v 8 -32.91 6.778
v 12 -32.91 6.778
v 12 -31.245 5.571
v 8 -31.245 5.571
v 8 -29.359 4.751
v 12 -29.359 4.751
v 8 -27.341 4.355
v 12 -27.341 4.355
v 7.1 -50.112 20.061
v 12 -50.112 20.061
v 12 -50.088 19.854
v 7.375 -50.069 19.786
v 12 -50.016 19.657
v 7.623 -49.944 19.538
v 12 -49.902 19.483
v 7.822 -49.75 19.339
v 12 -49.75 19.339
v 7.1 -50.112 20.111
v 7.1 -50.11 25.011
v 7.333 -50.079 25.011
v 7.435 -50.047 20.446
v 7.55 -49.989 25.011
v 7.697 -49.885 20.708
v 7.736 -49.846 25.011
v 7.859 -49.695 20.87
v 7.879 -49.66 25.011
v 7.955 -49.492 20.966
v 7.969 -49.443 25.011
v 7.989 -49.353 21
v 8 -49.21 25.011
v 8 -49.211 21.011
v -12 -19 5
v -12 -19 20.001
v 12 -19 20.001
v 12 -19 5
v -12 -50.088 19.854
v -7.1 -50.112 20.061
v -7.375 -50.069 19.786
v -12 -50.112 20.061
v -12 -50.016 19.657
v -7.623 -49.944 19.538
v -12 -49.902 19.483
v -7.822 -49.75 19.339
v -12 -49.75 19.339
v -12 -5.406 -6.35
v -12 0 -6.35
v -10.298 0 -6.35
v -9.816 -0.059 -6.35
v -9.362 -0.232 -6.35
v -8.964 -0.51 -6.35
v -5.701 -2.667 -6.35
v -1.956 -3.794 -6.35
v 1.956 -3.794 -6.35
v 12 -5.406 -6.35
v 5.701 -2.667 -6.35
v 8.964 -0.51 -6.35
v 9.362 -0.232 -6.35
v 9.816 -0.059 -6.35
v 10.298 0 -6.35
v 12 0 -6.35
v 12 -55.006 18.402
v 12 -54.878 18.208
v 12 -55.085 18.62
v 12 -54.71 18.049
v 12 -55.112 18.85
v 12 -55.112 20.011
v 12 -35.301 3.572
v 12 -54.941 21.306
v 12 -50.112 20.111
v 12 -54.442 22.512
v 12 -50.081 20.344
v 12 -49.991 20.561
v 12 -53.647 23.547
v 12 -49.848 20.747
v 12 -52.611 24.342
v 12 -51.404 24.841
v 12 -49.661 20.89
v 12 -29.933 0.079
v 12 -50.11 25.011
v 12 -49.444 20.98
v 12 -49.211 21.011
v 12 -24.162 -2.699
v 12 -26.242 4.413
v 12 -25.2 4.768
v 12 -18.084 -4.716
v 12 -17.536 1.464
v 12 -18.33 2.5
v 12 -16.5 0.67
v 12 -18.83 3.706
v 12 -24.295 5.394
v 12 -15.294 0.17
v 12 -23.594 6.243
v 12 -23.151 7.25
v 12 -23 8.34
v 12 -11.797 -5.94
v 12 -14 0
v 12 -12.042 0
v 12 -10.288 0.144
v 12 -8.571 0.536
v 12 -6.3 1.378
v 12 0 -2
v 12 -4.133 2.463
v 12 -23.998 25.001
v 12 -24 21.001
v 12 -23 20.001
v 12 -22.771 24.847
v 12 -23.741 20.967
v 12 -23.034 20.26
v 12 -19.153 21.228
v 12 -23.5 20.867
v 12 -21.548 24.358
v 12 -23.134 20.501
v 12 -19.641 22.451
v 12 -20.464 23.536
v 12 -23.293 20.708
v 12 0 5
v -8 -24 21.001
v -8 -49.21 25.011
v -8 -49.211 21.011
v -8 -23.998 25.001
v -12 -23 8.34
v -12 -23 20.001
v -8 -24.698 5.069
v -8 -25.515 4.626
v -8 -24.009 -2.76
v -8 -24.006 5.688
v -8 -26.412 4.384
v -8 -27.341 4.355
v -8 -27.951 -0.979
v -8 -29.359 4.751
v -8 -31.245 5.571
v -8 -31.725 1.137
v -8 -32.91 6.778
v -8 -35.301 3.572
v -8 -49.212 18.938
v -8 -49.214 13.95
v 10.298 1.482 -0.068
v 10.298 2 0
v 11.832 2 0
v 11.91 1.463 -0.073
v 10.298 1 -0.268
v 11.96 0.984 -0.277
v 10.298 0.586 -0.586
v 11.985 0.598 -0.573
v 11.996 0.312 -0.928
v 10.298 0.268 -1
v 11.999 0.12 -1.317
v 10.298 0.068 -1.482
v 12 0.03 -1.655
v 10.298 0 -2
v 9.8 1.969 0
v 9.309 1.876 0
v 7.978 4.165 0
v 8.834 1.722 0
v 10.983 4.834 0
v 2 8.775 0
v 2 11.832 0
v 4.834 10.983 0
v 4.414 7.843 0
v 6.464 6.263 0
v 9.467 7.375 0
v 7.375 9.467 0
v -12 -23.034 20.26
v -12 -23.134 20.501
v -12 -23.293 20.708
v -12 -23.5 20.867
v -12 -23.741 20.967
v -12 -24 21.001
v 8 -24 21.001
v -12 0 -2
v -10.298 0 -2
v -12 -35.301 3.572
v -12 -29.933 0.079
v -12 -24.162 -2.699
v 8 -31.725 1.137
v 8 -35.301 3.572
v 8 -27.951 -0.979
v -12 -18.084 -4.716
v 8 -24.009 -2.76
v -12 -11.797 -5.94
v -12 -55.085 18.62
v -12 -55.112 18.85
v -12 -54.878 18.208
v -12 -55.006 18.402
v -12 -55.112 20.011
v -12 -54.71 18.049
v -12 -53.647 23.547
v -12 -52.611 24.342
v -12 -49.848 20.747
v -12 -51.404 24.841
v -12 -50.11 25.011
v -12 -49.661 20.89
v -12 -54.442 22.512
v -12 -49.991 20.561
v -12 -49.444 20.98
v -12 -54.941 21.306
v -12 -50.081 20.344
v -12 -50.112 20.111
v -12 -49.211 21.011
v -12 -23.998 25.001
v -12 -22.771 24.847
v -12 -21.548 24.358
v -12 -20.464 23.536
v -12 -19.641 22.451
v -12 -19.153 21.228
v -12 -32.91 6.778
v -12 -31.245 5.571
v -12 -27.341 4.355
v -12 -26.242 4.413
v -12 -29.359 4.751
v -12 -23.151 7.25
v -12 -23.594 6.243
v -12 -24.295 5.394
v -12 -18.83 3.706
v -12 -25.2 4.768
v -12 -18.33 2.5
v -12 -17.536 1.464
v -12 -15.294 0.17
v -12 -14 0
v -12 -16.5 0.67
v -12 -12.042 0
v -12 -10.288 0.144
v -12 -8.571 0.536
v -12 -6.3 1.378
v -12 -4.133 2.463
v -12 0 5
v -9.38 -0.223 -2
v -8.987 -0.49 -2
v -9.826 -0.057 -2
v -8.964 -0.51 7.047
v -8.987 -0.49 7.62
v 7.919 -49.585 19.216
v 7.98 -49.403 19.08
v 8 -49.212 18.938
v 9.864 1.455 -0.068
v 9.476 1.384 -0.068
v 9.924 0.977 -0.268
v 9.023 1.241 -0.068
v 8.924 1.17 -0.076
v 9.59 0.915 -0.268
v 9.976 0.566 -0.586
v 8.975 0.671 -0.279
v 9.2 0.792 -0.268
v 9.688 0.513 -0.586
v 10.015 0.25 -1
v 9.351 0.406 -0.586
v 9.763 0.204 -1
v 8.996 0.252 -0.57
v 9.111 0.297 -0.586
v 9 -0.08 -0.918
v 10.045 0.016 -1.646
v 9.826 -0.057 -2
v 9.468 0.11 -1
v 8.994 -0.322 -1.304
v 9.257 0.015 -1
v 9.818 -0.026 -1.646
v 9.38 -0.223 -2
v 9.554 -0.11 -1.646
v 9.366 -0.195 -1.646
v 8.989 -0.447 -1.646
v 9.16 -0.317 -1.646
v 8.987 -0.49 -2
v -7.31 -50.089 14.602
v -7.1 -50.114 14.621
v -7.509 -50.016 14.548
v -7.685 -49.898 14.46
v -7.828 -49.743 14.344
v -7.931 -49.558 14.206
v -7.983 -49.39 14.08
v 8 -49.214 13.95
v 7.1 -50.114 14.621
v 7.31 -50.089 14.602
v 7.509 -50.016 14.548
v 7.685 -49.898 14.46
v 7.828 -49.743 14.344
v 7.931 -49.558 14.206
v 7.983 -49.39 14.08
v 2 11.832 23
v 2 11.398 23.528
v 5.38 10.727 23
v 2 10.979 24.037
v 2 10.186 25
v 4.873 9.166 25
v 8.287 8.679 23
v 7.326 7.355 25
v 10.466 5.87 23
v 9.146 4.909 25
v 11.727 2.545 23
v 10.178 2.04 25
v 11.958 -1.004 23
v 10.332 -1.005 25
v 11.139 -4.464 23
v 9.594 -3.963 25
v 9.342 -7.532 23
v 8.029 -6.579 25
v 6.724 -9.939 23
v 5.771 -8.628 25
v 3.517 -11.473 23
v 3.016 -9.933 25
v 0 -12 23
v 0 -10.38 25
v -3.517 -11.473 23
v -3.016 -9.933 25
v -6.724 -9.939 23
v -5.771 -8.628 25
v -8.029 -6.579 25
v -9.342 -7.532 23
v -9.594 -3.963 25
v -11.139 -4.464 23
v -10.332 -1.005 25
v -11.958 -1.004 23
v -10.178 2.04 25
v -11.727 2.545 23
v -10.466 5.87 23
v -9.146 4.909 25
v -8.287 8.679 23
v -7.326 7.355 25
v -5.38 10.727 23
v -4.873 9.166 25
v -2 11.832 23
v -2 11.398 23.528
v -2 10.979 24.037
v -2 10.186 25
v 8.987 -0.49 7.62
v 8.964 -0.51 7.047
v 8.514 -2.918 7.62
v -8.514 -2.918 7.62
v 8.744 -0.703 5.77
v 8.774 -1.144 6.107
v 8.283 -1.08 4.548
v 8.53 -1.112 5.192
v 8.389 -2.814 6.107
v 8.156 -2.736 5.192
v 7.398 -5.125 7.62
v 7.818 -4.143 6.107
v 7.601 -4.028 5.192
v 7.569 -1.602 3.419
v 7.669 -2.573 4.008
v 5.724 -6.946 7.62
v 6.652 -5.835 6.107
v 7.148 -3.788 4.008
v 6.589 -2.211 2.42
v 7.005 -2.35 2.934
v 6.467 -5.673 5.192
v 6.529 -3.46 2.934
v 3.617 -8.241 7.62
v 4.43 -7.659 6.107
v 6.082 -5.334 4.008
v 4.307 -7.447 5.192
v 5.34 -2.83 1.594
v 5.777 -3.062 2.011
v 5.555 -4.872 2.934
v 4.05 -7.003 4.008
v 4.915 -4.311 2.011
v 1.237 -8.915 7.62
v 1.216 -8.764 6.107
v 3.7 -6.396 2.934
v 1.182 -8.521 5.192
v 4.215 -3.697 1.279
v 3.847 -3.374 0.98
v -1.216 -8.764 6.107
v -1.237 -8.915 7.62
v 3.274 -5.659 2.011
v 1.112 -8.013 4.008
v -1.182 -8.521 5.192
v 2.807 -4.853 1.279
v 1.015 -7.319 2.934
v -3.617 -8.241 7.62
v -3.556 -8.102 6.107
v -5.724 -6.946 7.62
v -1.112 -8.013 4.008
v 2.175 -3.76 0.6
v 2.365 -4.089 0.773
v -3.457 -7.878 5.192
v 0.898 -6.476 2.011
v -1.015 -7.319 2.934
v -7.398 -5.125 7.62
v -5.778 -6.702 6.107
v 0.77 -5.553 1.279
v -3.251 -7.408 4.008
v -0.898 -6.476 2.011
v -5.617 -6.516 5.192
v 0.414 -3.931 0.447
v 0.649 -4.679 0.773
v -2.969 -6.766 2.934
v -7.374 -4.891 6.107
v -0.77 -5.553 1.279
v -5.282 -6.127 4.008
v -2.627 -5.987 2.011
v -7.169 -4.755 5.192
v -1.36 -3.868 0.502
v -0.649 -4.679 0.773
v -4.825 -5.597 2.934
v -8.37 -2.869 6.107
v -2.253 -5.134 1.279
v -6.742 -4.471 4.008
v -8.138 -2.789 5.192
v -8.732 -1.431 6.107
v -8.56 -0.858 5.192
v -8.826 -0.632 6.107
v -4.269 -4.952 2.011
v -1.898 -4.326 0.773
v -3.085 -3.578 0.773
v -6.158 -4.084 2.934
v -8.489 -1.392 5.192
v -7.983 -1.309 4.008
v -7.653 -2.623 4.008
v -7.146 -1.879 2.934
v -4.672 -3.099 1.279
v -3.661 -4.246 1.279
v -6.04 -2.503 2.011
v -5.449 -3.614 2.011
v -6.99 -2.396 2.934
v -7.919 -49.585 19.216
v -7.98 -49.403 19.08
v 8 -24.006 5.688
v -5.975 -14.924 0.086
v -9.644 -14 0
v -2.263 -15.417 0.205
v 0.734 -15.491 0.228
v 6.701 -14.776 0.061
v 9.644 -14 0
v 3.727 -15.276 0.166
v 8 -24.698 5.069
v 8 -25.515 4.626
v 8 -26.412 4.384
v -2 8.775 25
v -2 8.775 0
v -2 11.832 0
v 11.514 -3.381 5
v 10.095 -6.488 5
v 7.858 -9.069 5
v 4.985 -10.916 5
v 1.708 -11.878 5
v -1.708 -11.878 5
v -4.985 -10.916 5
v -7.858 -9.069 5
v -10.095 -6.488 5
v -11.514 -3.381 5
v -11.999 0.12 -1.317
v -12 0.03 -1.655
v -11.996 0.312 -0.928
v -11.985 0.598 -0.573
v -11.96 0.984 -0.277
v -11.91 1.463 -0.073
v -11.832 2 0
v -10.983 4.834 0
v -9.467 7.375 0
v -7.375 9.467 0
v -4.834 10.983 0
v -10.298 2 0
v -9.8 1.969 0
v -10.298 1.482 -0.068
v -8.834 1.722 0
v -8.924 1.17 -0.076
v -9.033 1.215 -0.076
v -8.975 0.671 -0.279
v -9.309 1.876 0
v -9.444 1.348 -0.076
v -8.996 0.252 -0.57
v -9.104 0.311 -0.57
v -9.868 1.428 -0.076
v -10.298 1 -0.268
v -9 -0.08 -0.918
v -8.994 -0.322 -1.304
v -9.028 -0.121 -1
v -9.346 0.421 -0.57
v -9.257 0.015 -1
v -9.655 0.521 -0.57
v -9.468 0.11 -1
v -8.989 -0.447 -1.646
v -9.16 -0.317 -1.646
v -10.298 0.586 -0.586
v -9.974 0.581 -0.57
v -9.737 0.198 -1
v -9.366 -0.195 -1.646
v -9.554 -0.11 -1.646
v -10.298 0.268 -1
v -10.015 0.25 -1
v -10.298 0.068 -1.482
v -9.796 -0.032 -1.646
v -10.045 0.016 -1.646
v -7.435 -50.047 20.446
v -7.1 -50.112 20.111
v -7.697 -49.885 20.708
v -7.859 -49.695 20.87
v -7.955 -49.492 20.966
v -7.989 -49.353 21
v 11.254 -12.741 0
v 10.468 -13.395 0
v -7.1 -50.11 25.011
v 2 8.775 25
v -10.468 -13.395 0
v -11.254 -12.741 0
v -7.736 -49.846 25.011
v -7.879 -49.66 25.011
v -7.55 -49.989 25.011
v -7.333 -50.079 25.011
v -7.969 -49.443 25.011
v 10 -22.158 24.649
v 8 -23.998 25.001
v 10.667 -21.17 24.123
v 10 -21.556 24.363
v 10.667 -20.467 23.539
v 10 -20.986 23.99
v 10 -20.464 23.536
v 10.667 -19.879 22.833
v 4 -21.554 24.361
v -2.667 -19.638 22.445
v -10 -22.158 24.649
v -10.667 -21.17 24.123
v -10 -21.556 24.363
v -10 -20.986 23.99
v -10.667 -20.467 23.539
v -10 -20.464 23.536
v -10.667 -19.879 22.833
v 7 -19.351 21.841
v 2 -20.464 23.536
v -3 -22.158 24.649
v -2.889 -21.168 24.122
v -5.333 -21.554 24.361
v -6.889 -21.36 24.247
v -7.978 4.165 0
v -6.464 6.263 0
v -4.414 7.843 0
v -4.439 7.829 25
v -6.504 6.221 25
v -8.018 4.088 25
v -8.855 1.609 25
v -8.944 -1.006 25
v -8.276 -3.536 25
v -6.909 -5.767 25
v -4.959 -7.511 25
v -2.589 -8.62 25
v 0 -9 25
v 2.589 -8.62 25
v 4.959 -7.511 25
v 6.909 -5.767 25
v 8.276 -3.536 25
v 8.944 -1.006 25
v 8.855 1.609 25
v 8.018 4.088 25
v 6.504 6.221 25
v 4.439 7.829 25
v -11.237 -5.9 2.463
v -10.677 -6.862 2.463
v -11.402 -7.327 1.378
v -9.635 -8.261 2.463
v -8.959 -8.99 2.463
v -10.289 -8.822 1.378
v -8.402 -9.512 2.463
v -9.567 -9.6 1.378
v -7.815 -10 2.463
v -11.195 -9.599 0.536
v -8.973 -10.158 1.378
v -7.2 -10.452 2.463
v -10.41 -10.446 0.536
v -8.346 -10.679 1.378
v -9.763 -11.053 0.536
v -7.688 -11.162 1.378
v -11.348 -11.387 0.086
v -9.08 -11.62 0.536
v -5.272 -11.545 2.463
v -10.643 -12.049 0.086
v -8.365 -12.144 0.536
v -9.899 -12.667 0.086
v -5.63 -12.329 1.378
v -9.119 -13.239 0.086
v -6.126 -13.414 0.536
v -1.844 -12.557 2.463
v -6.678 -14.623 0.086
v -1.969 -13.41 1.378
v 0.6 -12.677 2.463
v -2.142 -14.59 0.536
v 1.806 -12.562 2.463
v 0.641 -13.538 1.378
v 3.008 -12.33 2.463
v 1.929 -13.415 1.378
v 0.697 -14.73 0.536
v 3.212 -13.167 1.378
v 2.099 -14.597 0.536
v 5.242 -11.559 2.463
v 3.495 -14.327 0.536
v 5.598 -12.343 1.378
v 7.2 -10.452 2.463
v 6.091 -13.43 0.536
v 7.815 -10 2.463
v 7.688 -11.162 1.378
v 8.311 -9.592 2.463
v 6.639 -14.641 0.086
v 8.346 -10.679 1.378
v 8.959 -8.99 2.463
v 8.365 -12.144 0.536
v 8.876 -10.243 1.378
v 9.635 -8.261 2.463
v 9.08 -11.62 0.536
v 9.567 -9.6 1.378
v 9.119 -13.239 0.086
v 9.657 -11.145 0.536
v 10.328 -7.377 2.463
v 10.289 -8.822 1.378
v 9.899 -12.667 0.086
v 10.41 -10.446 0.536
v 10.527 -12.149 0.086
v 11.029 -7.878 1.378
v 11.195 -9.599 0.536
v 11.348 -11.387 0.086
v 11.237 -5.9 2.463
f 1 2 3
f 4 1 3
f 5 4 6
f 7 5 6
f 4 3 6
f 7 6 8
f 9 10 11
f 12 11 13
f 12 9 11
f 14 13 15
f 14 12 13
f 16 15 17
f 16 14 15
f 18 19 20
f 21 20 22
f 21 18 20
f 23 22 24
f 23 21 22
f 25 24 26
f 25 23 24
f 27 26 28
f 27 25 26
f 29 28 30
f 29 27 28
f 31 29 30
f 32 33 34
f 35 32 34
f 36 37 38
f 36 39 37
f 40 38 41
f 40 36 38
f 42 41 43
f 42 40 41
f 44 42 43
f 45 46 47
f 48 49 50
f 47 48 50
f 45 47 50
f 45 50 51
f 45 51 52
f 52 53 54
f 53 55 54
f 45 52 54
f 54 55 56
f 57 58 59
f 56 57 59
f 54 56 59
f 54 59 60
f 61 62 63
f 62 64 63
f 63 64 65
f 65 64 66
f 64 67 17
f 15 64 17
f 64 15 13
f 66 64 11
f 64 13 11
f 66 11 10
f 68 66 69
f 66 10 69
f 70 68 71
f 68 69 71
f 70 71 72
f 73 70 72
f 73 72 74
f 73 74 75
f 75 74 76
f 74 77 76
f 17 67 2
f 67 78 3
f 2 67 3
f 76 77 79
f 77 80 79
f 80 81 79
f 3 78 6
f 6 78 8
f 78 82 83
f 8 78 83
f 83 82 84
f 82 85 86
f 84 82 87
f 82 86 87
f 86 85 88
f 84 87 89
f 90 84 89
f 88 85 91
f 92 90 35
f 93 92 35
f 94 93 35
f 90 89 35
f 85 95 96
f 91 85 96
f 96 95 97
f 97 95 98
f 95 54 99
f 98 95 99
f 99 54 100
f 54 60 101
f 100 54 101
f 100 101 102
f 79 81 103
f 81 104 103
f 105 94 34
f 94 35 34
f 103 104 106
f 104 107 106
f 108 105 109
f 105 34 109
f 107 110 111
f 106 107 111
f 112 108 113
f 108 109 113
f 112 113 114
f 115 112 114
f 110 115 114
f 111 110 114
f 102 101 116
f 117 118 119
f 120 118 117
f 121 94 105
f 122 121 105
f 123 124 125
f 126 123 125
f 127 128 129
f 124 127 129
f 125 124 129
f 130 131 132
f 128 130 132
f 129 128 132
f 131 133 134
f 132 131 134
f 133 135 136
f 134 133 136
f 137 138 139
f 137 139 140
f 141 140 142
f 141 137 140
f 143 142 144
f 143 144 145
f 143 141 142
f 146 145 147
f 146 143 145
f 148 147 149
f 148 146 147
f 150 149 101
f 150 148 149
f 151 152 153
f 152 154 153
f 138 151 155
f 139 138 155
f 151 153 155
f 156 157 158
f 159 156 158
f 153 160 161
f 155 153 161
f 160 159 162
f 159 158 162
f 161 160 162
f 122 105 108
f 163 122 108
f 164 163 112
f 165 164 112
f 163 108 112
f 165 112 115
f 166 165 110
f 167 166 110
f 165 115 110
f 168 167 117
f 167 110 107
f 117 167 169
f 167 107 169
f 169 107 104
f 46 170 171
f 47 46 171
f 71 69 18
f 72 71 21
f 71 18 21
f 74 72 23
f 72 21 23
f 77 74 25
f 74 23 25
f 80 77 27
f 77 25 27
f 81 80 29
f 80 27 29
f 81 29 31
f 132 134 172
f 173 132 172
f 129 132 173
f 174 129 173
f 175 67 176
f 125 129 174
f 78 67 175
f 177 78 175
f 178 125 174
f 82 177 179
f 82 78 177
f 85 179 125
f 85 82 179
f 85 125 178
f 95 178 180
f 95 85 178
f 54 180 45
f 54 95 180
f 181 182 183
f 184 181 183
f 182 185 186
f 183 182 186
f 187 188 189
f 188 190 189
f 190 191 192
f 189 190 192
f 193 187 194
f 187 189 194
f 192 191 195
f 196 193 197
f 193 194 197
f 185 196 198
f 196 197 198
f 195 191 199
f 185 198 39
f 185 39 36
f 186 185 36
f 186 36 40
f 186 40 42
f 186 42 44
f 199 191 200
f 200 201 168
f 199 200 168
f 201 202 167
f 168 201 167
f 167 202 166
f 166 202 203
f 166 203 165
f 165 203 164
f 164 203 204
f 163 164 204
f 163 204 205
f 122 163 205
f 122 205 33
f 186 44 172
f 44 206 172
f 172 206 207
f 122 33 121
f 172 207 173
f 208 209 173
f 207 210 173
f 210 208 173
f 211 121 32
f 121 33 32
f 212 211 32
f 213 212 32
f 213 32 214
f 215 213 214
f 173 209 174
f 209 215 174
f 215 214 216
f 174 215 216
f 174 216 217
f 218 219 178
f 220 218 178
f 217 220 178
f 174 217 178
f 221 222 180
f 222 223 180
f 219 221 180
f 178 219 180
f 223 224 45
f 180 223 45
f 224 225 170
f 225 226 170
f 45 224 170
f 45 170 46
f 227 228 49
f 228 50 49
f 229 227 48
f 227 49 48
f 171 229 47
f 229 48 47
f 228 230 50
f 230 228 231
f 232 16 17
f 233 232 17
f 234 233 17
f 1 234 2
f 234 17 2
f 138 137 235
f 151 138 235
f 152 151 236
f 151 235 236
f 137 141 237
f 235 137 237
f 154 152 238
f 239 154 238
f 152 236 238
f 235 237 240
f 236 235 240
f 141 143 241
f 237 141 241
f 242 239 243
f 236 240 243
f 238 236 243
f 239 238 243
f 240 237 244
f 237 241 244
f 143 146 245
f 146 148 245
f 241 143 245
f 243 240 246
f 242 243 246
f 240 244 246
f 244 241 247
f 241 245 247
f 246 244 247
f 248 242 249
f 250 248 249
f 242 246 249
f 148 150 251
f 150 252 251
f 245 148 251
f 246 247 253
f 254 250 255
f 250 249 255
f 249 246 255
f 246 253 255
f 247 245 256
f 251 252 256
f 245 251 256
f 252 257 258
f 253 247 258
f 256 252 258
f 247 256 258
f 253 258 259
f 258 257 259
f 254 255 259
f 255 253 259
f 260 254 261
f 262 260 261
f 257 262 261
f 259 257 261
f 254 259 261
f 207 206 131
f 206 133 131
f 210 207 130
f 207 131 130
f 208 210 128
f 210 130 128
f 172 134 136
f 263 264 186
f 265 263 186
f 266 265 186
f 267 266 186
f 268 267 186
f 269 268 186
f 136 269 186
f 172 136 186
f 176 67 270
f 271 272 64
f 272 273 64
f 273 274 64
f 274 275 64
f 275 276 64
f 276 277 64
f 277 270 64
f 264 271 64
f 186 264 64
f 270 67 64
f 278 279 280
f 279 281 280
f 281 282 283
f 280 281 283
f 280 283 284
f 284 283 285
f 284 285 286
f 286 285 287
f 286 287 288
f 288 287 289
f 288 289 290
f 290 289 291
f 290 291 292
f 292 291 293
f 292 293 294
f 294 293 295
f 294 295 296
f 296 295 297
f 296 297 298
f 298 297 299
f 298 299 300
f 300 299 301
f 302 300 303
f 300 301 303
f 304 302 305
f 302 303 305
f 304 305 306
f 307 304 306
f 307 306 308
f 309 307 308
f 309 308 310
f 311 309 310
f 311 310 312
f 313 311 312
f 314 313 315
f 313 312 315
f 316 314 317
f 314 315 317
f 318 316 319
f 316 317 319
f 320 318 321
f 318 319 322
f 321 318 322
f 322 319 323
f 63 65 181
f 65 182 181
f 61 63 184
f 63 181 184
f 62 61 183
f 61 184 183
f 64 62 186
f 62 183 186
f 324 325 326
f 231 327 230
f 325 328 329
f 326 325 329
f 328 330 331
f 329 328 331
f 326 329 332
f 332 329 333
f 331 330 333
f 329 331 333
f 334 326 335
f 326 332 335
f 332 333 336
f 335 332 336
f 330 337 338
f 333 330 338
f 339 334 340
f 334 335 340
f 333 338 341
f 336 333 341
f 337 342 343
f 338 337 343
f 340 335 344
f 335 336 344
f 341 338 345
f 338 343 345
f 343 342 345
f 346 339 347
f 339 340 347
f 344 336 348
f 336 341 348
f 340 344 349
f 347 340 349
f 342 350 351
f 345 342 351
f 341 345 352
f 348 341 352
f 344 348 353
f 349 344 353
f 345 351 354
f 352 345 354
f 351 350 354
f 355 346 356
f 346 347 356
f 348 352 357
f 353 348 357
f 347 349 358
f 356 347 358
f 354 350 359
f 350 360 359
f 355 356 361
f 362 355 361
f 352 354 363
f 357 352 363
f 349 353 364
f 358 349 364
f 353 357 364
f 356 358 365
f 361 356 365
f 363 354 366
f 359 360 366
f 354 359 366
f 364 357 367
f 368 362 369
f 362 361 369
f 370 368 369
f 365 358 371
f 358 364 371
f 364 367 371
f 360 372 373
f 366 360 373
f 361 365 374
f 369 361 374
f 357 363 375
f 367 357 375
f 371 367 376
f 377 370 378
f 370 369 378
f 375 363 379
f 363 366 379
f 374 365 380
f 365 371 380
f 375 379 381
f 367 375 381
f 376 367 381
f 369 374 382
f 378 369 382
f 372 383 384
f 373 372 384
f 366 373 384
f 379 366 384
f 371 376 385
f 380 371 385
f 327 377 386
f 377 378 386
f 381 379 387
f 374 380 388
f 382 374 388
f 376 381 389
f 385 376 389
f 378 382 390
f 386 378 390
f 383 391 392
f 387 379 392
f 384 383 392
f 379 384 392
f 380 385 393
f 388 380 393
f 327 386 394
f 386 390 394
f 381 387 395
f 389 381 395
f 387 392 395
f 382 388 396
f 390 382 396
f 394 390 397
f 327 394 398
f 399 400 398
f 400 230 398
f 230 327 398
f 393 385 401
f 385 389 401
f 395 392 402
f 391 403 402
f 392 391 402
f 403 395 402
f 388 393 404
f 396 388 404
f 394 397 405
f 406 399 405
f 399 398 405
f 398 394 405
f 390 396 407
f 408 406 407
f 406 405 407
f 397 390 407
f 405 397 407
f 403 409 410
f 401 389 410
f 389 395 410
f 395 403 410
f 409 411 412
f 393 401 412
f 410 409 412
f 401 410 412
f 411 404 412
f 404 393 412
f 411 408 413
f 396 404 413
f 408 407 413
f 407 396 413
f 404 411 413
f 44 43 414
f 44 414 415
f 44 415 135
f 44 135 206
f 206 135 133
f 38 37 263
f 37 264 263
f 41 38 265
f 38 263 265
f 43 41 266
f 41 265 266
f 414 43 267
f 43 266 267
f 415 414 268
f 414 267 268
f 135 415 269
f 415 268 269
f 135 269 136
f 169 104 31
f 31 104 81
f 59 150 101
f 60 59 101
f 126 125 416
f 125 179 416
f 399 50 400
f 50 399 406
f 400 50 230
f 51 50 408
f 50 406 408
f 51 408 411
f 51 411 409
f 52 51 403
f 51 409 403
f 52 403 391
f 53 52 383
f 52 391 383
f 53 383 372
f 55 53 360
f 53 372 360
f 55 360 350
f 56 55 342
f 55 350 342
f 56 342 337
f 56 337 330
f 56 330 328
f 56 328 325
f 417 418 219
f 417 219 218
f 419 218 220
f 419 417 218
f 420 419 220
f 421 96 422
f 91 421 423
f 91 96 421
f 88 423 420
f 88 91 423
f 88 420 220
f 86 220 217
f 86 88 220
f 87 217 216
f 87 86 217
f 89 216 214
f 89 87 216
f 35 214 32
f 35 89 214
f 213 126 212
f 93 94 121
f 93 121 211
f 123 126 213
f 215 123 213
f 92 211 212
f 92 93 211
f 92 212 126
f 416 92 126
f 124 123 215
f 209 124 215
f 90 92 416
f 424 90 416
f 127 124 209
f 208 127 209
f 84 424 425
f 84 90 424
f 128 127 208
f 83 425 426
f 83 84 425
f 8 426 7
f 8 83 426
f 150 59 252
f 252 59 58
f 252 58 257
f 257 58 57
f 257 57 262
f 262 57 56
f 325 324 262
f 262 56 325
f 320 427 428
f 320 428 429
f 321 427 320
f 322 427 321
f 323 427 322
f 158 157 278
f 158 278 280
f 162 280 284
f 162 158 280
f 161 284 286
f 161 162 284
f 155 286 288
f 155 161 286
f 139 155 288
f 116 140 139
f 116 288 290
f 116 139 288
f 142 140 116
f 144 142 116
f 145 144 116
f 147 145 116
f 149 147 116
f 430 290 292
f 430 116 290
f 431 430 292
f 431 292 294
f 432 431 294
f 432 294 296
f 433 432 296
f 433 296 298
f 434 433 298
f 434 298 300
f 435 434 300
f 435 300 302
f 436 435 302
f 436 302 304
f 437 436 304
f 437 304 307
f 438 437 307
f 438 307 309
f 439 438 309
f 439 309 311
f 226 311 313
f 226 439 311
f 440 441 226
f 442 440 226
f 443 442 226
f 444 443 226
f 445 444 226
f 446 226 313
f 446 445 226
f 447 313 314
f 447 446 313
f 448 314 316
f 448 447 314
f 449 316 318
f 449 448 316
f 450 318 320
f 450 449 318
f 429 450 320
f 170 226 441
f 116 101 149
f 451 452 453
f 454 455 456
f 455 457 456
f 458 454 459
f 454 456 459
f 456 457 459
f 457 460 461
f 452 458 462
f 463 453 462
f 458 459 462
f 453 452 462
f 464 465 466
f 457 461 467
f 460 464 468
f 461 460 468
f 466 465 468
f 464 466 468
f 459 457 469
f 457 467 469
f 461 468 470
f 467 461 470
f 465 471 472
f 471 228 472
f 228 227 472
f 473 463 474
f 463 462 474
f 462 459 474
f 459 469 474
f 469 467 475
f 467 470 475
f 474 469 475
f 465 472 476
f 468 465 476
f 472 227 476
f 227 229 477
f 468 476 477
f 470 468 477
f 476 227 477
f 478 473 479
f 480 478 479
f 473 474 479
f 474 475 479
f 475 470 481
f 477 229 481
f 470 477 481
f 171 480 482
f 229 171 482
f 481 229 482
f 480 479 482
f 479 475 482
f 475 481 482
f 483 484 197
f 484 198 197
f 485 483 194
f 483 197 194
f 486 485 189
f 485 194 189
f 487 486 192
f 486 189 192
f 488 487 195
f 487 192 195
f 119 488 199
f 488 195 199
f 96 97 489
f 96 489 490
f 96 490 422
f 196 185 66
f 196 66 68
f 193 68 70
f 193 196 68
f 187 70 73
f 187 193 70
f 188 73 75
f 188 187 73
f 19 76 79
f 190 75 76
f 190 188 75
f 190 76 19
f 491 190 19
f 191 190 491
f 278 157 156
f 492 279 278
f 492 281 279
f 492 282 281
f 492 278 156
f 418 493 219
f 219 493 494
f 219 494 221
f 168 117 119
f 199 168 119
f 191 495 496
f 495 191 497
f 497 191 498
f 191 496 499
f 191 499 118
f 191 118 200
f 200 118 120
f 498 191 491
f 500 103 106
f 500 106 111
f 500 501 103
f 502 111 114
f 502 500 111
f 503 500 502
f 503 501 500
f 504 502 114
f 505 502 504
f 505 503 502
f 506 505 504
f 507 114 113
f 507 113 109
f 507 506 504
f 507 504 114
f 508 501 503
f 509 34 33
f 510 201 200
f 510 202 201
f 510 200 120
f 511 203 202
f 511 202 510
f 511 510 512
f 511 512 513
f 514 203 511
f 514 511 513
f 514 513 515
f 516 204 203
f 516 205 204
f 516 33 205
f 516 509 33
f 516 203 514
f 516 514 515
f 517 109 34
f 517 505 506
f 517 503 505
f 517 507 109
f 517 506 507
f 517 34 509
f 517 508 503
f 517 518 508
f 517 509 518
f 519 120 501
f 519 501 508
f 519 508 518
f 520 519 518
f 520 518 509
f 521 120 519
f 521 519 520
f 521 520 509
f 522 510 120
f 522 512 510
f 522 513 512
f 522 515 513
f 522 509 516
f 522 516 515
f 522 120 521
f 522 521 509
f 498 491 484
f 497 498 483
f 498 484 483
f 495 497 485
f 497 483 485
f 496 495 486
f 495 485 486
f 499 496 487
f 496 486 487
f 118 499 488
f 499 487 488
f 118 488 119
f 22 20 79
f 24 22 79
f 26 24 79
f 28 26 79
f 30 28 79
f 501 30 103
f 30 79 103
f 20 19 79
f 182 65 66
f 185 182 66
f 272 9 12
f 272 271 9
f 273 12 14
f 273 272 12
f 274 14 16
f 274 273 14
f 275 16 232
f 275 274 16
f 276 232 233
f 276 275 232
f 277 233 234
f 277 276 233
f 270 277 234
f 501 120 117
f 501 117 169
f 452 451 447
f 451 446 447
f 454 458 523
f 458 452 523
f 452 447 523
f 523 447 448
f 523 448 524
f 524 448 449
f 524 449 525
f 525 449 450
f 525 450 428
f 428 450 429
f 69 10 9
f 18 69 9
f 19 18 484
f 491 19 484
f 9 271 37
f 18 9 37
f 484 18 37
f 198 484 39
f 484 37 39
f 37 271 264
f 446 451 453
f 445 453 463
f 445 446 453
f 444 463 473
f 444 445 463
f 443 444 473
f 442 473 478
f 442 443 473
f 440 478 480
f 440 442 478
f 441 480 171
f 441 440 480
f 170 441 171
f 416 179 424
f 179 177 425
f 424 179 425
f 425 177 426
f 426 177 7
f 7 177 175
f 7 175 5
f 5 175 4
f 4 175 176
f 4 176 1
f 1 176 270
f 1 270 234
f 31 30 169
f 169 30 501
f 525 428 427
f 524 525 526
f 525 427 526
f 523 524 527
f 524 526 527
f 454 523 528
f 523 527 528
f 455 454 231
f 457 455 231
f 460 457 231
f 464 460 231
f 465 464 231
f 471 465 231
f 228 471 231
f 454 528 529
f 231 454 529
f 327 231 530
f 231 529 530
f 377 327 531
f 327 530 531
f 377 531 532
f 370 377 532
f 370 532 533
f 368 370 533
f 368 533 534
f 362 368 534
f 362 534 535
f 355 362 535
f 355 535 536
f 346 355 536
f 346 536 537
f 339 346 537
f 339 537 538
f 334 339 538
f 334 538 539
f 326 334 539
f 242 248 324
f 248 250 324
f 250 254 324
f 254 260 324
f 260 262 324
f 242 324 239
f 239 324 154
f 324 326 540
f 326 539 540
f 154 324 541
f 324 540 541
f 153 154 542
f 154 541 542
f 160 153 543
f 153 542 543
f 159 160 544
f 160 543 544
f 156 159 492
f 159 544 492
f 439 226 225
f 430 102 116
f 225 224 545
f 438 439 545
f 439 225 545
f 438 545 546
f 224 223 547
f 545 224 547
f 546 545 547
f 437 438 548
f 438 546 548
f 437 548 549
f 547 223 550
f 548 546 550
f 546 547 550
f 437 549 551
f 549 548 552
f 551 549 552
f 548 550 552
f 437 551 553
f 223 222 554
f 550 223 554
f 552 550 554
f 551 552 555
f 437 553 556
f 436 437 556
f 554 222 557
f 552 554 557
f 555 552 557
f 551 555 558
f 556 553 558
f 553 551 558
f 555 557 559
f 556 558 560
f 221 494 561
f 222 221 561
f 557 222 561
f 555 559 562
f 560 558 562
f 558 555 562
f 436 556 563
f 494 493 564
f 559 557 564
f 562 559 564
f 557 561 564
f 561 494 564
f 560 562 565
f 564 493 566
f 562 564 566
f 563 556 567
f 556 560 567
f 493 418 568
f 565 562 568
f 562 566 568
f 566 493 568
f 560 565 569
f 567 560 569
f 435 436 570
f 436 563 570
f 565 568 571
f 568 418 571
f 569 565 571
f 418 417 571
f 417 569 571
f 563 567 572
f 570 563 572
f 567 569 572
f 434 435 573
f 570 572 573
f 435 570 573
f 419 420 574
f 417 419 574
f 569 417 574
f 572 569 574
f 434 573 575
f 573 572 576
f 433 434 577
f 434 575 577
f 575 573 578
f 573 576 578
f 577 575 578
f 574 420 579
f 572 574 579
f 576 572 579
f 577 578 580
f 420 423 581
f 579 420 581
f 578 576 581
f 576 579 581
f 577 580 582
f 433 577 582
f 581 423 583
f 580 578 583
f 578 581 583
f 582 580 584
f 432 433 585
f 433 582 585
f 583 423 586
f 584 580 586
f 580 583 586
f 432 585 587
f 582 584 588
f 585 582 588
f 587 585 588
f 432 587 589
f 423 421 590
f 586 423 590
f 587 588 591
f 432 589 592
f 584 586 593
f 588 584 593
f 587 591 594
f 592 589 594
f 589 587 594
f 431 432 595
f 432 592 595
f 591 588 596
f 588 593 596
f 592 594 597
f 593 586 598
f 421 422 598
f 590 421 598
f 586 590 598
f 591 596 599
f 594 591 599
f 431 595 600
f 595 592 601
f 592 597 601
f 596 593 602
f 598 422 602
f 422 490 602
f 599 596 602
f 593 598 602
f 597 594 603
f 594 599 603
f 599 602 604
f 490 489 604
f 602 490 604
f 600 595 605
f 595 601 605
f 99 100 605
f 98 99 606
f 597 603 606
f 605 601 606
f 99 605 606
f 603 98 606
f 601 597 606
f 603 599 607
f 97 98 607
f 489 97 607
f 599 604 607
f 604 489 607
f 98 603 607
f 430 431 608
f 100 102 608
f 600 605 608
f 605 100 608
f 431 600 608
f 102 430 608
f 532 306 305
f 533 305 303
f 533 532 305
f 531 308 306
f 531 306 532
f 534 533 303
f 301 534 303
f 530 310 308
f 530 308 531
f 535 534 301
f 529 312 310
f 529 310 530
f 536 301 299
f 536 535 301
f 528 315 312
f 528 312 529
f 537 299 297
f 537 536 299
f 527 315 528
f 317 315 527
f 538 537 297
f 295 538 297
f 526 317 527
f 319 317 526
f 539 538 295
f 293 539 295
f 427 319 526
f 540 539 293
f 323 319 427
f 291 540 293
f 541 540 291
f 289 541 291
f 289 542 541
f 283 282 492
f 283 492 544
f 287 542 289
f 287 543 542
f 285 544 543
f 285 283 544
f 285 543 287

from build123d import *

# Parameters (mm, degrees)
SKETCH1_R           = 12
BOSS_EXTRUDE1_DEPTH = 25
CUT_EXTRUDE1_DEPTH  = 25
BOSS_EXTRUDE2_DEPTH = 6.35
FILLET1_R           = 7.62
CHAMFER1_SIZE       = 2
CHAMFER1_SIZE2      = 1.6195680663900194
BOSS_EXTRUDE3_DEPTH = 3
BOSS_EXTRUDE4_DEPTH = 24
FILLET3_R           = 50
FILLET7_R           = 5
FILLET8_R           = 5
FILLET9_R           = 5
CUT_EXTRUDE2_DEPTH  = 24
FILLET10_R          = 1
FILLET12_R          = 2
FILLET13_R          = 2
CUT_EXTRUDE3_REACH  = 66.534
SKETCH9_W           = 16.00000000000001
SKETCH9_H           = 26.111776117406702
FILLET15_R          = 4
BOSS_EXTRUDE5_REACH = 69.872
FILLET16_R          = 0.9


with BuildPart() as part:
    # Sketch1 → Boss-Extrude1 (new body)
    with BuildSketch(Plane.XY):
        Circle(SKETCH1_R)
    extrude(amount=BOSS_EXTRUDE1_DEPTH)

    # Sketch2 → Cut-Extrude1 (cut)
    with BuildSketch(Plane.XY.offset(25)):
        with BuildLine():
            Line((-2, 12), (2, 12))
            Line((2, 12), (2, 8.77496438739212))
            ThreePointArc((2, 8.77496438739212), (-1.65e-15, -8.999999999999998), (-2, 8.77496438739212))
            Line((-2, 8.77496438739212), (-2, 12))
        make_face()
    extrude(amount=-CUT_EXTRUDE1_DEPTH, mode=Mode.SUBTRACT)

    # Sketch3 → Boss-Extrude2 (add)
    with BuildSketch(Plane(origin=(0, 0, 0), x_dir=(-1, 0, 0), z_dir=(0, 0, -1))):
        with BuildLine():
            Line((-9.50278743316929, 0), (-12.000000000000002, 0))
            Line((-12.000000000000002, 0), (-12.000000000000004, -19))
            Line((-12.000000000000004, -19), (12.000000000000004, -19))
            Line((12.000000000000004, -19), (12.000000000000002, 0))
            Line((12.000000000000002, 0), (9.50278743316929, 0))
            ThreePointArc((9.50278743316929, 0), (8.2e-16, -3.9369999999999994), (-9.50278743316929, 0))
        make_face()
    extrude(amount=BOSS_EXTRUDE2_DEPTH)

    # Fillet1
    # the kernel refuses this fillet: 7.62 mm, written as the material it adds along each edge
    with BuildSketch(Plane(origin=(-8.3e-16, 4.2e-16, 0), x_dir=(0.0031415874858799547, 0.9999950652018581, 0), z_dir=(-0.9999950652018581, 0.0031415874858799547, 0))) as fillet1_piece_1_section:
        with BuildLine():
            CenterArc((8.999999999999998 - FILLET1_R, -FILLET1_R), FILLET1_R, 0, 89.99999999999999)
            Line((8.999999999999998 - FILLET1_R, 2.66e-15), (8.999999999999998, 0))
            Line((8.999999999999998, 0), (8.999999999999996, -FILLET1_R))
        make_face()
    fillet1_piece_1 = revolve(axis=Axis((-8.3e-16, 4.2e-16, 0), (0, 0, -1)), revolution_arc=359.64, mode=Mode.PRIVATE)
    fillet1_piece_1 = fillet1_piece_1 - Plane(origin=(0, 9.500000000000028, 1.752978238820399), x_dir=(-0.7072104958822112, -0.7070030512763273, 0), z_dir=(0, 0, 1)) * Cylinder(13.437000000000028, 36, mode=Mode.PRIVATE)
    add(fillet1_piece_1)

    # Chamfer1
    chamfer1_edges = [part.edges().sort_by_distance(p)[0] for p in [
        (-1.0525e-13, -12, 25),
    ]]
    chamfer1_side = [part.faces().sort_by_distance(p)[0] for p in [
        (-2.2e-15, -12, 12.5),
    ]]
    chamfer(chamfer1_edges, length=CHAMFER1_SIZE, length2=CHAMFER1_SIZE2, reference=chamfer1_side[0])

    # Sketch6 → Boss-Extrude3 (add)
    with BuildSketch(Plane.XZ.offset(19)):
        Polygon((-12.000000000000007, 25), (-12.000000000000005, -6.35), (12.000000000000005, -6.35), (12.000000000000004, 25.00000000000001), align=None)
    extrude(amount=BOSS_EXTRUDE3_DEPTH)

    # Sketch7 → Boss-Extrude4 (add)
    with BuildSketch(Plane(origin=(12.000000000000002, 1.1e-15, 0), x_dir=(0, 0, -1), z_dir=(1, 1.9e-16, 0))):
        Polygon((-25.00000000000001, -22.000000000000004), (6.35, -22.000000000000004), (-18.348646063087493, -55.11177405445072), (-25.013162071560505, -55.11177405445072), align=None)
    extrude(amount=-BOSS_EXTRUDE4_DEPTH)

    # Fillet3
    fillet3_edges = [part.edges().sort_by_distance(p)[0] for p in [
        (0, -22, -6.35),
    ]]
    fillet(fillet3_edges, radius=FILLET3_R)

    # Fillet7
    # the kernel refuses this fillet: 5 mm, written as the material it adds along each edge
    with BuildSketch(Plane(origin=(0, 0, 0), x_dir=(-1, 6e-17, 0), z_dir=(6e-17, 1, 0))) as fillet7_piece_1_section:
        with BuildLine():
            CenterArc((12.000000000000002 + FILLET7_R, FILLET7_R), FILLET7_R, 180, 90)
            Line((12, FILLET7_R), (12.000000000000002, 0))
            Line((12.000000000000002, 0), (12.000000000000002 + FILLET7_R, 0))
        make_face()
    fillet7_piece_1 = revolve(axis=Axis((0, 0, 0), (0, 0, 1)), revolution_arc=179.99999999999997, mode=Mode.PRIVATE)
    fillet7_piece_1 = split(fillet7_piece_1, bisect_by=Plane(origin=(12.000000000000004, -12.055106327045037, 2.4999999999999996), z_dir=(-1, -9e-17, 0)), keep=Keep.TOP, mode=Mode.PRIVATE)
    fillet7_piece_1 = split(fillet7_piece_1, bisect_by=Plane(origin=(-12.000000000000004, -12.055106327045038, 2.4999999999999996), z_dir=(1, -9e-17, 0)), keep=Keep.TOP, mode=Mode.PRIVATE)
    add(fillet7_piece_1)
    with BuildSketch(Plane(origin=(12.000000000000004, -19, 0), x_dir=(0, 1, 0), z_dir=(-1, 0, 0))) as fillet7_piece_2:
        with BuildLine():
            CenterArc((FILLET7_R, -FILLET7_R), FILLET7_R, 90, 90)
            Line((0, -FILLET7_R), (0, 0))
            Line((0, 0), (FILLET7_R, 0))
        make_face()
    extrude(amount=24.000000000000007)

    # Fillet8
    fillet8_edges = [part.edges().sort_by_distance(p)[0] for p in [
        (1.243e-14, -55.11177405445072, 25.013162071560505),
    ]]
    fillet(fillet8_edges, radius=FILLET8_R)

    # Fillet9
    fillet9_edges = [part.edges().sort_by_distance(p)[0] for p in [
        (-1.78e-15, -19, 25.000000000000007),
    ]]
    fillet(fillet9_edges, radius=FILLET9_R)

    # Sketch8 → Cut-Extrude2 (cut)
    with BuildSketch(Plane(origin=(12.000000000000002, 1.1e-15, 0), x_dir=(0, 0, -1), z_dir=(1, 1.9e-16, 0))):
        with BuildLine():
            Line((-4.999999999999998, -23), (-20.000794613515104, -23.000000000000004))
            ThreePointArc((-20.000794613515104, -23.000000000000004), (-20.70776084176148, -23.292752693805703), (-21.000794534510295, -23.999602495761817))
            Line((-21.000794534510295, -23.999602495761817), (-21.011174076183625, -50.11137655021254))
            ThreePointArc((-21.011174076183625, -50.11137655021254), (-20.819933843558175, -50.699913295165096), (-20.318980441541633, -51.06322310199948))
            Line((-20.318980441541633, -51.06322310199948), (-6.777868461008763, -32.90958669617576))
            ThreePointArc((-6.777868461008763, -32.90958669617576), (-4.469648137926145, -28.20942596380706), (-4.999999999999998, -23))
        make_face()
    extrude(amount=-CUT_EXTRUDE2_DEPTH, mode=Mode.SUBTRACT)

    # Fillet10
    fillet10_edges = [part.edges().sort_by_distance(p)[0] for p in [
        (1.243e-14, -55.11177405445072, 18.348646063087493),
    ]]
    fillet(fillet10_edges, radius=FILLET10_R)

    # Fillet12
    fillet12_edges = [part.edges().sort_by_distance(p)[0] for p in [
        (-9.502787433169292, -8.9e-16, -3.175),
        (9.502787433169292, -8.9e-16, -3.175),
    ]]
    fillet(fillet12_edges, radius=FILLET12_R)

    # Fillet13
    # the kernel refuses this fillet: 2 mm, written as the material it adds along each edge
    with BuildSketch(Plane(origin=(10.298105116962052, 0, 0), x_dir=(0, 0, -1), z_dir=(1, 0, 0))) as fillet13_piece_1_section:
        with BuildLine():
            CenterArc((FILLET13_R, FILLET13_R), FILLET13_R, 180, 90)
            Line((-2.2e-16, FILLET13_R), (0, 0))
            Line((0, 0), (FILLET13_R, 0))
        make_face()
    fillet13_piece_1 = extrude(amount=6.701894883037948, mode=Mode.PRIVATE)
    fillet13_piece_1 = fillet13_piece_1 & Plane(origin=(0, 0, -0.44903446636731825), x_dir=(1, 0, 0), z_dir=(0, 0, -1)) * Cylinder(12, 22, mode=Mode.PRIVATE)
    add(fillet13_piece_1)
    with BuildSketch(Plane(origin=(-10.298105116962049, -2, 0), x_dir=(-0.07369380939887726, -0.9972809145152042, 0), z_dir=(-0.9972809145152042, 0.07369380939887726, 0))) as fillet13_piece_2_section:
        with BuildLine():
            CenterArc((2.0000000000000004 + FILLET13_R, -FILLET13_R), FILLET13_R, 89.99999999999997, 90)
            Line((2.0000000000000004 + FILLET13_R, 2.2e-16), (2.0000000000000004, 0))
            Line((2.0000000000000004, 0), (2, -FILLET13_R))
        make_face()
    fillet13_piece_2 = revolve(axis=Axis((-10.298105116962049, -2, 0), (0, 0, 1)), revolution_arc=184.22617539365706, mode=Mode.PRIVATE)
    fillet13_piece_2 = fillet13_piece_2 - Plane(origin=(-8.3e-16, 4.2e-16, -0.6407272575669332), x_dir=(0.22222222222222238, 0.9749960430435691, 0), z_dir=(0, 0, 1)) * Cylinder(8.999999999999998, 17, mode=Mode.PRIVATE)
    add(fillet13_piece_2)
    with BuildSketch(Plane(origin=(10.298105116962052, -2, 0), x_dir=(0, 1, 0), z_dir=(1, 0, 0))) as fillet13_piece_3_section:
        with BuildLine():
            CenterArc((2 + FILLET13_R, -FILLET13_R), FILLET13_R, 90, 90)
            Line((2 + FILLET13_R, 2.2e-16), (2, 0))
            Line((2, 0), (2, -FILLET13_R))
        make_face()
    fillet13_piece_3 = revolve(axis=Axis((10.298105116962052, -2, 0), (0, 0, 1)), revolution_arc=184.22617539365754, mode=Mode.PRIVATE)
    fillet13_piece_3 = fillet13_piece_3 - Plane(origin=(-8.3e-16, 4.2e-16, -0.8153326958488982), x_dir=(0.22222222222222238, 0.9749960430435691, 0), z_dir=(0, 0, 1)) * Cylinder(8.999999999999998, 16, mode=Mode.PRIVATE)
    add(fillet13_piece_3)
    with BuildSketch(Plane(origin=(-17, 0, 0), x_dir=(0, 0, -1), z_dir=(1, 0, 0))) as fillet13_piece_4_section:
        with BuildLine():
            CenterArc((FILLET13_R, FILLET13_R), FILLET13_R, 180, 90)
            Line((-2.2e-16, FILLET13_R), (0, 0))
            Line((0, 0), (FILLET13_R, 0))
        make_face()
    fillet13_piece_4 = extrude(amount=6.7018948830379514, mode=Mode.PRIVATE)
    fillet13_piece_4 = fillet13_piece_4 & Plane(origin=(0, 0, -0.4490342356486683), x_dir=(1, 0, 0), z_dir=(0, 0, -1)) * Cylinder(12, 22, mode=Mode.PRIVATE)
    add(fillet13_piece_4)

    # Cut-Extrude3: up to this plane
    cut_extrude3_end = Plane(origin=(-57.60742830022284, -22.000000000000018, -6.35), z_dir=(0, -0.5979035190056836, -0.8015680769345921))
    # Sketch9 → Cut-Extrude3 (cut, up to the surface)
    with BuildSketch(Plane(origin=(0, 0.00993412895799998, 24.991250957210262), x_dir=(1, 0, 0), z_dir=(0, 0.0003975042381898005, 0.9999999209951873)), mode=Mode.PRIVATE) as cut_extrude3_sk1:
        with Locations((0, -37.06383656321388)):
            Rectangle(SKETCH9_W, SKETCH9_H)
    cut_extrude3_tool1 = split(extrude(cut_extrude3_sk1.sketch, amount=-CUT_EXTRUDE3_REACH, mode=Mode.PRIVATE), bisect_by=cut_extrude3_end, keep=Keep.BOTH, mode=Mode.PRIVATE)
    add(cut_extrude3_tool1.solids().sort_by_distance((0, -37.0539, 25.005984))[0], mode=Mode.SUBTRACT)

    # Fillet15
    # the kernel refuses this fillet: 4 mm, written as the material it adds along each edge
    with BuildSketch(Plane(origin=(12.000000000000007, -23, 4.999999999999999), x_dir=(0, 0, 1), z_dir=(-1, -1.9e-16, 0))) as fillet15_piece_1_section:
        with BuildLine():
            CenterArc((3.3402809515369762, -4), FILLET15_R, 89.99999999999997, 94.89048853854479)
            ThreePointArc((-0.6451568973076123, -4.341006089384081), (-0.5764760987946635, -2.1327689764079274), (0, 0))
            Line((0, 0), (3.340280951536978, 0))
        make_face()
    fillet15_piece_1 = extrude(amount=24, mode=Mode.PRIVATE)
    fillet15_piece_1 = split(fillet15_piece_1, bisect_by=Plane(origin=(10.00000000000001, -24.005623928158137, 5.852699641182596), z_dir=(0, 0.9999999209951872, -0.0003975042381898005)), keep=Keep.TOP, mode=Mode.PRIVATE)
    fillet15_piece_1 = split(fillet15_piece_1, bisect_by=Plane(origin=(8.000000000000005, -23.36055913801038, 5.852443225174341), z_dir=(1, 0, 0)), keep=Keep.TOP, mode=Mode.PRIVATE)
    add(fillet15_piece_1)
    with BuildSketch(Plane(origin=(12.000000000000007, -23, 4.999999999999999), x_dir=(0, 0, 1), z_dir=(-1, -1.9e-16, 0))) as fillet15_piece_2_section:
        with BuildLine():
            CenterArc((3.3402809515369762, -4), FILLET15_R, 89.99999999999997, 94.89048853854479)
            ThreePointArc((-0.6451568973076123, -4.341006089384081), (-0.5764760987946635, -2.1327689764079274), (0, 0))
            Line((0, 0), (3.340280951536978, 0))
        make_face()
    fillet15_piece_2 = extrude(amount=24, mode=Mode.PRIVATE)
    fillet15_piece_2 = split(fillet15_piece_2, bisect_by=Plane(origin=(9.999999999999982, -24.006080855539047, 4.703209142937297), z_dir=(0, -0.9999999209951872, 0.0003975042381898005)), keep=Keep.TOP, mode=Mode.PRIVATE)
    fillet15_piece_2 = split(fillet15_piece_2, bisect_by=Plane(origin=(8.000000000000005, -24.979834026786314, 4.7035962139803935), z_dir=(1, 0, 0)), keep=Keep.TOP, mode=Mode.PRIVATE)
    add(fillet15_piece_2)
    with BuildSketch(Plane(origin=(12.000000000000007, -23, 4.999999999999999), x_dir=(0, 0, 1), z_dir=(-1, -1.9e-16, 0))) as fillet15_piece_3_section:
        with BuildLine():
            CenterArc((3.3402809515369762, -4), FILLET15_R, 89.99999999999997, 94.89048853854479)
            ThreePointArc((-0.6451568973076123, -4.341006089384081), (-0.5764760987946635, -2.1327689764079274), (0, 0))
            Line((0, 0), (3.340280951536978, 0))
        make_face()
    fillet15_piece_3 = extrude(amount=24, mode=Mode.PRIVATE)
    fillet15_piece_3 = split(fillet15_piece_3, bisect_by=Plane(origin=(-8.000000000000005, -23.360559138010377, 5.852443225174337), z_dir=(1, 0, 0)), keep=Keep.TOP, mode=Mode.PRIVATE)
    fillet15_piece_3 = split(fillet15_piece_3, bisect_by=Plane(origin=(-1.954e-14, -24.005623928158137, 5.852699641182593), z_dir=(0, 0.9999999209951872, -0.0003975042381898005)), keep=Keep.TOP, mode=Mode.PRIVATE)
    fillet15_piece_3 = split(fillet15_piece_3, bisect_by=Plane(origin=(8.000000000000005, -23.36055913801037, 5.852443225174337), z_dir=(-1, 0, 0)), keep=Keep.TOP, mode=Mode.PRIVATE)
    add(fillet15_piece_3)
    with BuildSketch(Plane(origin=(12.000000000000007, -23, 4.999999999999999), x_dir=(0, 0, 1), z_dir=(-1, -1.9e-16, 0))) as fillet15_piece_4_section:
        with BuildLine():
            CenterArc((3.3402809515369762, -4), FILLET15_R, 89.99999999999997, 94.89048853854479)
            ThreePointArc((-0.6451568973076123, -4.341006089384081), (-0.5764760987946635, -2.1327689764079274), (0, 0))
            Line((0, 0), (3.340280951536978, 0))
        make_face()
    fillet15_piece_4 = extrude(amount=24, mode=Mode.PRIVATE)
    fillet15_piece_4 = split(fillet15_piece_4, bisect_by=Plane(origin=(-8.000000000000005, -23.360559138010377, 5.852443225174341), z_dir=(-1, 0, 0)), keep=Keep.TOP, mode=Mode.PRIVATE)
    fillet15_piece_4 = split(fillet15_piece_4, bisect_by=Plane(origin=(-10.000000000000002, -24.005623928158137, 5.852699641182593), z_dir=(0, 0.9999999209951872, -0.0003975042381898005)), keep=Keep.TOP, mode=Mode.PRIVATE)
    add(fillet15_piece_4)
    with BuildSketch(Plane(origin=(12.000000000000007, -23, 4.999999999999999), x_dir=(0, 0, 1), z_dir=(-1, -1.9e-16, 0))) as fillet15_piece_5_section:
        with BuildLine():
            CenterArc((3.3402809515369762, -4), FILLET15_R, 89.99999999999997, 94.89048853854479)
            ThreePointArc((-0.6451568973076123, -4.341006089384081), (-0.5764760987946635, -2.1327689764079274), (0, 0))
            Line((0, 0), (3.340280951536978, 0))
        make_face()
    fillet15_piece_5 = extrude(amount=24, mode=Mode.PRIVATE)
    fillet15_piece_5 = split(fillet15_piece_5, bisect_by=Plane(origin=(-8.000000000000005, -24.979834026786307, 4.70359621398039), z_dir=(-1, 0, 0)), keep=Keep.TOP, mode=Mode.PRIVATE)
    fillet15_piece_5 = split(fillet15_piece_5, bisect_by=Plane(origin=(-10.000000000000002, -24.006080855539047, 4.703209142937293), z_dir=(0, -0.9999999209951872, 0.0003975042381898005)), keep=Keep.TOP, mode=Mode.PRIVATE)
    add(fillet15_piece_5)

    # Sketch10 → Boss-Extrude5 (add, up to next)
    with BuildSketch(Plane(origin=(0, -50.1197206622178, 0.01992280295411781), x_dir=(1, 0, 0), z_dir=(0, 0.9999999209951873, -0.00039750423818980053)), mode=Mode.PRIVATE) as boss_extrude5_sk1:
        Polygon((-12.00000000000001, -19.589475982962057), (12.00000000000001, -19.589475982962057), (12.000000000000012, -20.99125293163952), (-12.000000000000005, -20.99125293163952), align=None)
    boss_extrude5_tool1 = extrude(boss_extrude5_sk1.sketch, amount=-BOSS_EXTRUDE5_REACH, mode=Mode.PRIVATE) - part.part
    add(boss_extrude5_tool1.solids().sort_by_distance((0, -50.111655, 20.310286))[0])

    # Fillet16
    fillet16_edges = [part.edges().sort_by_distance(p)[0] for p in [
        (-9.999999999999996, -50.11137655021255, 21.01117407618362),
        (10.000000000000007, -50.11137655021254, 21.01117407618362),
        (8.000000000000005, -50.11292528511694, 17.1150274864303),
        (8.000000000000005, -50.11058154173617, 23.011173918174002),
        (-8.000000000000005, -50.11292528511694, 17.115027486430296),
        (-8.000000000000005, -50.11058154173617, 23.011173918174002),
        (10.000000000000007, -50.11193376249066, 19.609397238253294),
        (-10.000000000000007, -50.11193376249066, 19.609397238253294),
    ]]
    fillet(fillet16_edges, radius=FILLET16_R)


solid = part.part
